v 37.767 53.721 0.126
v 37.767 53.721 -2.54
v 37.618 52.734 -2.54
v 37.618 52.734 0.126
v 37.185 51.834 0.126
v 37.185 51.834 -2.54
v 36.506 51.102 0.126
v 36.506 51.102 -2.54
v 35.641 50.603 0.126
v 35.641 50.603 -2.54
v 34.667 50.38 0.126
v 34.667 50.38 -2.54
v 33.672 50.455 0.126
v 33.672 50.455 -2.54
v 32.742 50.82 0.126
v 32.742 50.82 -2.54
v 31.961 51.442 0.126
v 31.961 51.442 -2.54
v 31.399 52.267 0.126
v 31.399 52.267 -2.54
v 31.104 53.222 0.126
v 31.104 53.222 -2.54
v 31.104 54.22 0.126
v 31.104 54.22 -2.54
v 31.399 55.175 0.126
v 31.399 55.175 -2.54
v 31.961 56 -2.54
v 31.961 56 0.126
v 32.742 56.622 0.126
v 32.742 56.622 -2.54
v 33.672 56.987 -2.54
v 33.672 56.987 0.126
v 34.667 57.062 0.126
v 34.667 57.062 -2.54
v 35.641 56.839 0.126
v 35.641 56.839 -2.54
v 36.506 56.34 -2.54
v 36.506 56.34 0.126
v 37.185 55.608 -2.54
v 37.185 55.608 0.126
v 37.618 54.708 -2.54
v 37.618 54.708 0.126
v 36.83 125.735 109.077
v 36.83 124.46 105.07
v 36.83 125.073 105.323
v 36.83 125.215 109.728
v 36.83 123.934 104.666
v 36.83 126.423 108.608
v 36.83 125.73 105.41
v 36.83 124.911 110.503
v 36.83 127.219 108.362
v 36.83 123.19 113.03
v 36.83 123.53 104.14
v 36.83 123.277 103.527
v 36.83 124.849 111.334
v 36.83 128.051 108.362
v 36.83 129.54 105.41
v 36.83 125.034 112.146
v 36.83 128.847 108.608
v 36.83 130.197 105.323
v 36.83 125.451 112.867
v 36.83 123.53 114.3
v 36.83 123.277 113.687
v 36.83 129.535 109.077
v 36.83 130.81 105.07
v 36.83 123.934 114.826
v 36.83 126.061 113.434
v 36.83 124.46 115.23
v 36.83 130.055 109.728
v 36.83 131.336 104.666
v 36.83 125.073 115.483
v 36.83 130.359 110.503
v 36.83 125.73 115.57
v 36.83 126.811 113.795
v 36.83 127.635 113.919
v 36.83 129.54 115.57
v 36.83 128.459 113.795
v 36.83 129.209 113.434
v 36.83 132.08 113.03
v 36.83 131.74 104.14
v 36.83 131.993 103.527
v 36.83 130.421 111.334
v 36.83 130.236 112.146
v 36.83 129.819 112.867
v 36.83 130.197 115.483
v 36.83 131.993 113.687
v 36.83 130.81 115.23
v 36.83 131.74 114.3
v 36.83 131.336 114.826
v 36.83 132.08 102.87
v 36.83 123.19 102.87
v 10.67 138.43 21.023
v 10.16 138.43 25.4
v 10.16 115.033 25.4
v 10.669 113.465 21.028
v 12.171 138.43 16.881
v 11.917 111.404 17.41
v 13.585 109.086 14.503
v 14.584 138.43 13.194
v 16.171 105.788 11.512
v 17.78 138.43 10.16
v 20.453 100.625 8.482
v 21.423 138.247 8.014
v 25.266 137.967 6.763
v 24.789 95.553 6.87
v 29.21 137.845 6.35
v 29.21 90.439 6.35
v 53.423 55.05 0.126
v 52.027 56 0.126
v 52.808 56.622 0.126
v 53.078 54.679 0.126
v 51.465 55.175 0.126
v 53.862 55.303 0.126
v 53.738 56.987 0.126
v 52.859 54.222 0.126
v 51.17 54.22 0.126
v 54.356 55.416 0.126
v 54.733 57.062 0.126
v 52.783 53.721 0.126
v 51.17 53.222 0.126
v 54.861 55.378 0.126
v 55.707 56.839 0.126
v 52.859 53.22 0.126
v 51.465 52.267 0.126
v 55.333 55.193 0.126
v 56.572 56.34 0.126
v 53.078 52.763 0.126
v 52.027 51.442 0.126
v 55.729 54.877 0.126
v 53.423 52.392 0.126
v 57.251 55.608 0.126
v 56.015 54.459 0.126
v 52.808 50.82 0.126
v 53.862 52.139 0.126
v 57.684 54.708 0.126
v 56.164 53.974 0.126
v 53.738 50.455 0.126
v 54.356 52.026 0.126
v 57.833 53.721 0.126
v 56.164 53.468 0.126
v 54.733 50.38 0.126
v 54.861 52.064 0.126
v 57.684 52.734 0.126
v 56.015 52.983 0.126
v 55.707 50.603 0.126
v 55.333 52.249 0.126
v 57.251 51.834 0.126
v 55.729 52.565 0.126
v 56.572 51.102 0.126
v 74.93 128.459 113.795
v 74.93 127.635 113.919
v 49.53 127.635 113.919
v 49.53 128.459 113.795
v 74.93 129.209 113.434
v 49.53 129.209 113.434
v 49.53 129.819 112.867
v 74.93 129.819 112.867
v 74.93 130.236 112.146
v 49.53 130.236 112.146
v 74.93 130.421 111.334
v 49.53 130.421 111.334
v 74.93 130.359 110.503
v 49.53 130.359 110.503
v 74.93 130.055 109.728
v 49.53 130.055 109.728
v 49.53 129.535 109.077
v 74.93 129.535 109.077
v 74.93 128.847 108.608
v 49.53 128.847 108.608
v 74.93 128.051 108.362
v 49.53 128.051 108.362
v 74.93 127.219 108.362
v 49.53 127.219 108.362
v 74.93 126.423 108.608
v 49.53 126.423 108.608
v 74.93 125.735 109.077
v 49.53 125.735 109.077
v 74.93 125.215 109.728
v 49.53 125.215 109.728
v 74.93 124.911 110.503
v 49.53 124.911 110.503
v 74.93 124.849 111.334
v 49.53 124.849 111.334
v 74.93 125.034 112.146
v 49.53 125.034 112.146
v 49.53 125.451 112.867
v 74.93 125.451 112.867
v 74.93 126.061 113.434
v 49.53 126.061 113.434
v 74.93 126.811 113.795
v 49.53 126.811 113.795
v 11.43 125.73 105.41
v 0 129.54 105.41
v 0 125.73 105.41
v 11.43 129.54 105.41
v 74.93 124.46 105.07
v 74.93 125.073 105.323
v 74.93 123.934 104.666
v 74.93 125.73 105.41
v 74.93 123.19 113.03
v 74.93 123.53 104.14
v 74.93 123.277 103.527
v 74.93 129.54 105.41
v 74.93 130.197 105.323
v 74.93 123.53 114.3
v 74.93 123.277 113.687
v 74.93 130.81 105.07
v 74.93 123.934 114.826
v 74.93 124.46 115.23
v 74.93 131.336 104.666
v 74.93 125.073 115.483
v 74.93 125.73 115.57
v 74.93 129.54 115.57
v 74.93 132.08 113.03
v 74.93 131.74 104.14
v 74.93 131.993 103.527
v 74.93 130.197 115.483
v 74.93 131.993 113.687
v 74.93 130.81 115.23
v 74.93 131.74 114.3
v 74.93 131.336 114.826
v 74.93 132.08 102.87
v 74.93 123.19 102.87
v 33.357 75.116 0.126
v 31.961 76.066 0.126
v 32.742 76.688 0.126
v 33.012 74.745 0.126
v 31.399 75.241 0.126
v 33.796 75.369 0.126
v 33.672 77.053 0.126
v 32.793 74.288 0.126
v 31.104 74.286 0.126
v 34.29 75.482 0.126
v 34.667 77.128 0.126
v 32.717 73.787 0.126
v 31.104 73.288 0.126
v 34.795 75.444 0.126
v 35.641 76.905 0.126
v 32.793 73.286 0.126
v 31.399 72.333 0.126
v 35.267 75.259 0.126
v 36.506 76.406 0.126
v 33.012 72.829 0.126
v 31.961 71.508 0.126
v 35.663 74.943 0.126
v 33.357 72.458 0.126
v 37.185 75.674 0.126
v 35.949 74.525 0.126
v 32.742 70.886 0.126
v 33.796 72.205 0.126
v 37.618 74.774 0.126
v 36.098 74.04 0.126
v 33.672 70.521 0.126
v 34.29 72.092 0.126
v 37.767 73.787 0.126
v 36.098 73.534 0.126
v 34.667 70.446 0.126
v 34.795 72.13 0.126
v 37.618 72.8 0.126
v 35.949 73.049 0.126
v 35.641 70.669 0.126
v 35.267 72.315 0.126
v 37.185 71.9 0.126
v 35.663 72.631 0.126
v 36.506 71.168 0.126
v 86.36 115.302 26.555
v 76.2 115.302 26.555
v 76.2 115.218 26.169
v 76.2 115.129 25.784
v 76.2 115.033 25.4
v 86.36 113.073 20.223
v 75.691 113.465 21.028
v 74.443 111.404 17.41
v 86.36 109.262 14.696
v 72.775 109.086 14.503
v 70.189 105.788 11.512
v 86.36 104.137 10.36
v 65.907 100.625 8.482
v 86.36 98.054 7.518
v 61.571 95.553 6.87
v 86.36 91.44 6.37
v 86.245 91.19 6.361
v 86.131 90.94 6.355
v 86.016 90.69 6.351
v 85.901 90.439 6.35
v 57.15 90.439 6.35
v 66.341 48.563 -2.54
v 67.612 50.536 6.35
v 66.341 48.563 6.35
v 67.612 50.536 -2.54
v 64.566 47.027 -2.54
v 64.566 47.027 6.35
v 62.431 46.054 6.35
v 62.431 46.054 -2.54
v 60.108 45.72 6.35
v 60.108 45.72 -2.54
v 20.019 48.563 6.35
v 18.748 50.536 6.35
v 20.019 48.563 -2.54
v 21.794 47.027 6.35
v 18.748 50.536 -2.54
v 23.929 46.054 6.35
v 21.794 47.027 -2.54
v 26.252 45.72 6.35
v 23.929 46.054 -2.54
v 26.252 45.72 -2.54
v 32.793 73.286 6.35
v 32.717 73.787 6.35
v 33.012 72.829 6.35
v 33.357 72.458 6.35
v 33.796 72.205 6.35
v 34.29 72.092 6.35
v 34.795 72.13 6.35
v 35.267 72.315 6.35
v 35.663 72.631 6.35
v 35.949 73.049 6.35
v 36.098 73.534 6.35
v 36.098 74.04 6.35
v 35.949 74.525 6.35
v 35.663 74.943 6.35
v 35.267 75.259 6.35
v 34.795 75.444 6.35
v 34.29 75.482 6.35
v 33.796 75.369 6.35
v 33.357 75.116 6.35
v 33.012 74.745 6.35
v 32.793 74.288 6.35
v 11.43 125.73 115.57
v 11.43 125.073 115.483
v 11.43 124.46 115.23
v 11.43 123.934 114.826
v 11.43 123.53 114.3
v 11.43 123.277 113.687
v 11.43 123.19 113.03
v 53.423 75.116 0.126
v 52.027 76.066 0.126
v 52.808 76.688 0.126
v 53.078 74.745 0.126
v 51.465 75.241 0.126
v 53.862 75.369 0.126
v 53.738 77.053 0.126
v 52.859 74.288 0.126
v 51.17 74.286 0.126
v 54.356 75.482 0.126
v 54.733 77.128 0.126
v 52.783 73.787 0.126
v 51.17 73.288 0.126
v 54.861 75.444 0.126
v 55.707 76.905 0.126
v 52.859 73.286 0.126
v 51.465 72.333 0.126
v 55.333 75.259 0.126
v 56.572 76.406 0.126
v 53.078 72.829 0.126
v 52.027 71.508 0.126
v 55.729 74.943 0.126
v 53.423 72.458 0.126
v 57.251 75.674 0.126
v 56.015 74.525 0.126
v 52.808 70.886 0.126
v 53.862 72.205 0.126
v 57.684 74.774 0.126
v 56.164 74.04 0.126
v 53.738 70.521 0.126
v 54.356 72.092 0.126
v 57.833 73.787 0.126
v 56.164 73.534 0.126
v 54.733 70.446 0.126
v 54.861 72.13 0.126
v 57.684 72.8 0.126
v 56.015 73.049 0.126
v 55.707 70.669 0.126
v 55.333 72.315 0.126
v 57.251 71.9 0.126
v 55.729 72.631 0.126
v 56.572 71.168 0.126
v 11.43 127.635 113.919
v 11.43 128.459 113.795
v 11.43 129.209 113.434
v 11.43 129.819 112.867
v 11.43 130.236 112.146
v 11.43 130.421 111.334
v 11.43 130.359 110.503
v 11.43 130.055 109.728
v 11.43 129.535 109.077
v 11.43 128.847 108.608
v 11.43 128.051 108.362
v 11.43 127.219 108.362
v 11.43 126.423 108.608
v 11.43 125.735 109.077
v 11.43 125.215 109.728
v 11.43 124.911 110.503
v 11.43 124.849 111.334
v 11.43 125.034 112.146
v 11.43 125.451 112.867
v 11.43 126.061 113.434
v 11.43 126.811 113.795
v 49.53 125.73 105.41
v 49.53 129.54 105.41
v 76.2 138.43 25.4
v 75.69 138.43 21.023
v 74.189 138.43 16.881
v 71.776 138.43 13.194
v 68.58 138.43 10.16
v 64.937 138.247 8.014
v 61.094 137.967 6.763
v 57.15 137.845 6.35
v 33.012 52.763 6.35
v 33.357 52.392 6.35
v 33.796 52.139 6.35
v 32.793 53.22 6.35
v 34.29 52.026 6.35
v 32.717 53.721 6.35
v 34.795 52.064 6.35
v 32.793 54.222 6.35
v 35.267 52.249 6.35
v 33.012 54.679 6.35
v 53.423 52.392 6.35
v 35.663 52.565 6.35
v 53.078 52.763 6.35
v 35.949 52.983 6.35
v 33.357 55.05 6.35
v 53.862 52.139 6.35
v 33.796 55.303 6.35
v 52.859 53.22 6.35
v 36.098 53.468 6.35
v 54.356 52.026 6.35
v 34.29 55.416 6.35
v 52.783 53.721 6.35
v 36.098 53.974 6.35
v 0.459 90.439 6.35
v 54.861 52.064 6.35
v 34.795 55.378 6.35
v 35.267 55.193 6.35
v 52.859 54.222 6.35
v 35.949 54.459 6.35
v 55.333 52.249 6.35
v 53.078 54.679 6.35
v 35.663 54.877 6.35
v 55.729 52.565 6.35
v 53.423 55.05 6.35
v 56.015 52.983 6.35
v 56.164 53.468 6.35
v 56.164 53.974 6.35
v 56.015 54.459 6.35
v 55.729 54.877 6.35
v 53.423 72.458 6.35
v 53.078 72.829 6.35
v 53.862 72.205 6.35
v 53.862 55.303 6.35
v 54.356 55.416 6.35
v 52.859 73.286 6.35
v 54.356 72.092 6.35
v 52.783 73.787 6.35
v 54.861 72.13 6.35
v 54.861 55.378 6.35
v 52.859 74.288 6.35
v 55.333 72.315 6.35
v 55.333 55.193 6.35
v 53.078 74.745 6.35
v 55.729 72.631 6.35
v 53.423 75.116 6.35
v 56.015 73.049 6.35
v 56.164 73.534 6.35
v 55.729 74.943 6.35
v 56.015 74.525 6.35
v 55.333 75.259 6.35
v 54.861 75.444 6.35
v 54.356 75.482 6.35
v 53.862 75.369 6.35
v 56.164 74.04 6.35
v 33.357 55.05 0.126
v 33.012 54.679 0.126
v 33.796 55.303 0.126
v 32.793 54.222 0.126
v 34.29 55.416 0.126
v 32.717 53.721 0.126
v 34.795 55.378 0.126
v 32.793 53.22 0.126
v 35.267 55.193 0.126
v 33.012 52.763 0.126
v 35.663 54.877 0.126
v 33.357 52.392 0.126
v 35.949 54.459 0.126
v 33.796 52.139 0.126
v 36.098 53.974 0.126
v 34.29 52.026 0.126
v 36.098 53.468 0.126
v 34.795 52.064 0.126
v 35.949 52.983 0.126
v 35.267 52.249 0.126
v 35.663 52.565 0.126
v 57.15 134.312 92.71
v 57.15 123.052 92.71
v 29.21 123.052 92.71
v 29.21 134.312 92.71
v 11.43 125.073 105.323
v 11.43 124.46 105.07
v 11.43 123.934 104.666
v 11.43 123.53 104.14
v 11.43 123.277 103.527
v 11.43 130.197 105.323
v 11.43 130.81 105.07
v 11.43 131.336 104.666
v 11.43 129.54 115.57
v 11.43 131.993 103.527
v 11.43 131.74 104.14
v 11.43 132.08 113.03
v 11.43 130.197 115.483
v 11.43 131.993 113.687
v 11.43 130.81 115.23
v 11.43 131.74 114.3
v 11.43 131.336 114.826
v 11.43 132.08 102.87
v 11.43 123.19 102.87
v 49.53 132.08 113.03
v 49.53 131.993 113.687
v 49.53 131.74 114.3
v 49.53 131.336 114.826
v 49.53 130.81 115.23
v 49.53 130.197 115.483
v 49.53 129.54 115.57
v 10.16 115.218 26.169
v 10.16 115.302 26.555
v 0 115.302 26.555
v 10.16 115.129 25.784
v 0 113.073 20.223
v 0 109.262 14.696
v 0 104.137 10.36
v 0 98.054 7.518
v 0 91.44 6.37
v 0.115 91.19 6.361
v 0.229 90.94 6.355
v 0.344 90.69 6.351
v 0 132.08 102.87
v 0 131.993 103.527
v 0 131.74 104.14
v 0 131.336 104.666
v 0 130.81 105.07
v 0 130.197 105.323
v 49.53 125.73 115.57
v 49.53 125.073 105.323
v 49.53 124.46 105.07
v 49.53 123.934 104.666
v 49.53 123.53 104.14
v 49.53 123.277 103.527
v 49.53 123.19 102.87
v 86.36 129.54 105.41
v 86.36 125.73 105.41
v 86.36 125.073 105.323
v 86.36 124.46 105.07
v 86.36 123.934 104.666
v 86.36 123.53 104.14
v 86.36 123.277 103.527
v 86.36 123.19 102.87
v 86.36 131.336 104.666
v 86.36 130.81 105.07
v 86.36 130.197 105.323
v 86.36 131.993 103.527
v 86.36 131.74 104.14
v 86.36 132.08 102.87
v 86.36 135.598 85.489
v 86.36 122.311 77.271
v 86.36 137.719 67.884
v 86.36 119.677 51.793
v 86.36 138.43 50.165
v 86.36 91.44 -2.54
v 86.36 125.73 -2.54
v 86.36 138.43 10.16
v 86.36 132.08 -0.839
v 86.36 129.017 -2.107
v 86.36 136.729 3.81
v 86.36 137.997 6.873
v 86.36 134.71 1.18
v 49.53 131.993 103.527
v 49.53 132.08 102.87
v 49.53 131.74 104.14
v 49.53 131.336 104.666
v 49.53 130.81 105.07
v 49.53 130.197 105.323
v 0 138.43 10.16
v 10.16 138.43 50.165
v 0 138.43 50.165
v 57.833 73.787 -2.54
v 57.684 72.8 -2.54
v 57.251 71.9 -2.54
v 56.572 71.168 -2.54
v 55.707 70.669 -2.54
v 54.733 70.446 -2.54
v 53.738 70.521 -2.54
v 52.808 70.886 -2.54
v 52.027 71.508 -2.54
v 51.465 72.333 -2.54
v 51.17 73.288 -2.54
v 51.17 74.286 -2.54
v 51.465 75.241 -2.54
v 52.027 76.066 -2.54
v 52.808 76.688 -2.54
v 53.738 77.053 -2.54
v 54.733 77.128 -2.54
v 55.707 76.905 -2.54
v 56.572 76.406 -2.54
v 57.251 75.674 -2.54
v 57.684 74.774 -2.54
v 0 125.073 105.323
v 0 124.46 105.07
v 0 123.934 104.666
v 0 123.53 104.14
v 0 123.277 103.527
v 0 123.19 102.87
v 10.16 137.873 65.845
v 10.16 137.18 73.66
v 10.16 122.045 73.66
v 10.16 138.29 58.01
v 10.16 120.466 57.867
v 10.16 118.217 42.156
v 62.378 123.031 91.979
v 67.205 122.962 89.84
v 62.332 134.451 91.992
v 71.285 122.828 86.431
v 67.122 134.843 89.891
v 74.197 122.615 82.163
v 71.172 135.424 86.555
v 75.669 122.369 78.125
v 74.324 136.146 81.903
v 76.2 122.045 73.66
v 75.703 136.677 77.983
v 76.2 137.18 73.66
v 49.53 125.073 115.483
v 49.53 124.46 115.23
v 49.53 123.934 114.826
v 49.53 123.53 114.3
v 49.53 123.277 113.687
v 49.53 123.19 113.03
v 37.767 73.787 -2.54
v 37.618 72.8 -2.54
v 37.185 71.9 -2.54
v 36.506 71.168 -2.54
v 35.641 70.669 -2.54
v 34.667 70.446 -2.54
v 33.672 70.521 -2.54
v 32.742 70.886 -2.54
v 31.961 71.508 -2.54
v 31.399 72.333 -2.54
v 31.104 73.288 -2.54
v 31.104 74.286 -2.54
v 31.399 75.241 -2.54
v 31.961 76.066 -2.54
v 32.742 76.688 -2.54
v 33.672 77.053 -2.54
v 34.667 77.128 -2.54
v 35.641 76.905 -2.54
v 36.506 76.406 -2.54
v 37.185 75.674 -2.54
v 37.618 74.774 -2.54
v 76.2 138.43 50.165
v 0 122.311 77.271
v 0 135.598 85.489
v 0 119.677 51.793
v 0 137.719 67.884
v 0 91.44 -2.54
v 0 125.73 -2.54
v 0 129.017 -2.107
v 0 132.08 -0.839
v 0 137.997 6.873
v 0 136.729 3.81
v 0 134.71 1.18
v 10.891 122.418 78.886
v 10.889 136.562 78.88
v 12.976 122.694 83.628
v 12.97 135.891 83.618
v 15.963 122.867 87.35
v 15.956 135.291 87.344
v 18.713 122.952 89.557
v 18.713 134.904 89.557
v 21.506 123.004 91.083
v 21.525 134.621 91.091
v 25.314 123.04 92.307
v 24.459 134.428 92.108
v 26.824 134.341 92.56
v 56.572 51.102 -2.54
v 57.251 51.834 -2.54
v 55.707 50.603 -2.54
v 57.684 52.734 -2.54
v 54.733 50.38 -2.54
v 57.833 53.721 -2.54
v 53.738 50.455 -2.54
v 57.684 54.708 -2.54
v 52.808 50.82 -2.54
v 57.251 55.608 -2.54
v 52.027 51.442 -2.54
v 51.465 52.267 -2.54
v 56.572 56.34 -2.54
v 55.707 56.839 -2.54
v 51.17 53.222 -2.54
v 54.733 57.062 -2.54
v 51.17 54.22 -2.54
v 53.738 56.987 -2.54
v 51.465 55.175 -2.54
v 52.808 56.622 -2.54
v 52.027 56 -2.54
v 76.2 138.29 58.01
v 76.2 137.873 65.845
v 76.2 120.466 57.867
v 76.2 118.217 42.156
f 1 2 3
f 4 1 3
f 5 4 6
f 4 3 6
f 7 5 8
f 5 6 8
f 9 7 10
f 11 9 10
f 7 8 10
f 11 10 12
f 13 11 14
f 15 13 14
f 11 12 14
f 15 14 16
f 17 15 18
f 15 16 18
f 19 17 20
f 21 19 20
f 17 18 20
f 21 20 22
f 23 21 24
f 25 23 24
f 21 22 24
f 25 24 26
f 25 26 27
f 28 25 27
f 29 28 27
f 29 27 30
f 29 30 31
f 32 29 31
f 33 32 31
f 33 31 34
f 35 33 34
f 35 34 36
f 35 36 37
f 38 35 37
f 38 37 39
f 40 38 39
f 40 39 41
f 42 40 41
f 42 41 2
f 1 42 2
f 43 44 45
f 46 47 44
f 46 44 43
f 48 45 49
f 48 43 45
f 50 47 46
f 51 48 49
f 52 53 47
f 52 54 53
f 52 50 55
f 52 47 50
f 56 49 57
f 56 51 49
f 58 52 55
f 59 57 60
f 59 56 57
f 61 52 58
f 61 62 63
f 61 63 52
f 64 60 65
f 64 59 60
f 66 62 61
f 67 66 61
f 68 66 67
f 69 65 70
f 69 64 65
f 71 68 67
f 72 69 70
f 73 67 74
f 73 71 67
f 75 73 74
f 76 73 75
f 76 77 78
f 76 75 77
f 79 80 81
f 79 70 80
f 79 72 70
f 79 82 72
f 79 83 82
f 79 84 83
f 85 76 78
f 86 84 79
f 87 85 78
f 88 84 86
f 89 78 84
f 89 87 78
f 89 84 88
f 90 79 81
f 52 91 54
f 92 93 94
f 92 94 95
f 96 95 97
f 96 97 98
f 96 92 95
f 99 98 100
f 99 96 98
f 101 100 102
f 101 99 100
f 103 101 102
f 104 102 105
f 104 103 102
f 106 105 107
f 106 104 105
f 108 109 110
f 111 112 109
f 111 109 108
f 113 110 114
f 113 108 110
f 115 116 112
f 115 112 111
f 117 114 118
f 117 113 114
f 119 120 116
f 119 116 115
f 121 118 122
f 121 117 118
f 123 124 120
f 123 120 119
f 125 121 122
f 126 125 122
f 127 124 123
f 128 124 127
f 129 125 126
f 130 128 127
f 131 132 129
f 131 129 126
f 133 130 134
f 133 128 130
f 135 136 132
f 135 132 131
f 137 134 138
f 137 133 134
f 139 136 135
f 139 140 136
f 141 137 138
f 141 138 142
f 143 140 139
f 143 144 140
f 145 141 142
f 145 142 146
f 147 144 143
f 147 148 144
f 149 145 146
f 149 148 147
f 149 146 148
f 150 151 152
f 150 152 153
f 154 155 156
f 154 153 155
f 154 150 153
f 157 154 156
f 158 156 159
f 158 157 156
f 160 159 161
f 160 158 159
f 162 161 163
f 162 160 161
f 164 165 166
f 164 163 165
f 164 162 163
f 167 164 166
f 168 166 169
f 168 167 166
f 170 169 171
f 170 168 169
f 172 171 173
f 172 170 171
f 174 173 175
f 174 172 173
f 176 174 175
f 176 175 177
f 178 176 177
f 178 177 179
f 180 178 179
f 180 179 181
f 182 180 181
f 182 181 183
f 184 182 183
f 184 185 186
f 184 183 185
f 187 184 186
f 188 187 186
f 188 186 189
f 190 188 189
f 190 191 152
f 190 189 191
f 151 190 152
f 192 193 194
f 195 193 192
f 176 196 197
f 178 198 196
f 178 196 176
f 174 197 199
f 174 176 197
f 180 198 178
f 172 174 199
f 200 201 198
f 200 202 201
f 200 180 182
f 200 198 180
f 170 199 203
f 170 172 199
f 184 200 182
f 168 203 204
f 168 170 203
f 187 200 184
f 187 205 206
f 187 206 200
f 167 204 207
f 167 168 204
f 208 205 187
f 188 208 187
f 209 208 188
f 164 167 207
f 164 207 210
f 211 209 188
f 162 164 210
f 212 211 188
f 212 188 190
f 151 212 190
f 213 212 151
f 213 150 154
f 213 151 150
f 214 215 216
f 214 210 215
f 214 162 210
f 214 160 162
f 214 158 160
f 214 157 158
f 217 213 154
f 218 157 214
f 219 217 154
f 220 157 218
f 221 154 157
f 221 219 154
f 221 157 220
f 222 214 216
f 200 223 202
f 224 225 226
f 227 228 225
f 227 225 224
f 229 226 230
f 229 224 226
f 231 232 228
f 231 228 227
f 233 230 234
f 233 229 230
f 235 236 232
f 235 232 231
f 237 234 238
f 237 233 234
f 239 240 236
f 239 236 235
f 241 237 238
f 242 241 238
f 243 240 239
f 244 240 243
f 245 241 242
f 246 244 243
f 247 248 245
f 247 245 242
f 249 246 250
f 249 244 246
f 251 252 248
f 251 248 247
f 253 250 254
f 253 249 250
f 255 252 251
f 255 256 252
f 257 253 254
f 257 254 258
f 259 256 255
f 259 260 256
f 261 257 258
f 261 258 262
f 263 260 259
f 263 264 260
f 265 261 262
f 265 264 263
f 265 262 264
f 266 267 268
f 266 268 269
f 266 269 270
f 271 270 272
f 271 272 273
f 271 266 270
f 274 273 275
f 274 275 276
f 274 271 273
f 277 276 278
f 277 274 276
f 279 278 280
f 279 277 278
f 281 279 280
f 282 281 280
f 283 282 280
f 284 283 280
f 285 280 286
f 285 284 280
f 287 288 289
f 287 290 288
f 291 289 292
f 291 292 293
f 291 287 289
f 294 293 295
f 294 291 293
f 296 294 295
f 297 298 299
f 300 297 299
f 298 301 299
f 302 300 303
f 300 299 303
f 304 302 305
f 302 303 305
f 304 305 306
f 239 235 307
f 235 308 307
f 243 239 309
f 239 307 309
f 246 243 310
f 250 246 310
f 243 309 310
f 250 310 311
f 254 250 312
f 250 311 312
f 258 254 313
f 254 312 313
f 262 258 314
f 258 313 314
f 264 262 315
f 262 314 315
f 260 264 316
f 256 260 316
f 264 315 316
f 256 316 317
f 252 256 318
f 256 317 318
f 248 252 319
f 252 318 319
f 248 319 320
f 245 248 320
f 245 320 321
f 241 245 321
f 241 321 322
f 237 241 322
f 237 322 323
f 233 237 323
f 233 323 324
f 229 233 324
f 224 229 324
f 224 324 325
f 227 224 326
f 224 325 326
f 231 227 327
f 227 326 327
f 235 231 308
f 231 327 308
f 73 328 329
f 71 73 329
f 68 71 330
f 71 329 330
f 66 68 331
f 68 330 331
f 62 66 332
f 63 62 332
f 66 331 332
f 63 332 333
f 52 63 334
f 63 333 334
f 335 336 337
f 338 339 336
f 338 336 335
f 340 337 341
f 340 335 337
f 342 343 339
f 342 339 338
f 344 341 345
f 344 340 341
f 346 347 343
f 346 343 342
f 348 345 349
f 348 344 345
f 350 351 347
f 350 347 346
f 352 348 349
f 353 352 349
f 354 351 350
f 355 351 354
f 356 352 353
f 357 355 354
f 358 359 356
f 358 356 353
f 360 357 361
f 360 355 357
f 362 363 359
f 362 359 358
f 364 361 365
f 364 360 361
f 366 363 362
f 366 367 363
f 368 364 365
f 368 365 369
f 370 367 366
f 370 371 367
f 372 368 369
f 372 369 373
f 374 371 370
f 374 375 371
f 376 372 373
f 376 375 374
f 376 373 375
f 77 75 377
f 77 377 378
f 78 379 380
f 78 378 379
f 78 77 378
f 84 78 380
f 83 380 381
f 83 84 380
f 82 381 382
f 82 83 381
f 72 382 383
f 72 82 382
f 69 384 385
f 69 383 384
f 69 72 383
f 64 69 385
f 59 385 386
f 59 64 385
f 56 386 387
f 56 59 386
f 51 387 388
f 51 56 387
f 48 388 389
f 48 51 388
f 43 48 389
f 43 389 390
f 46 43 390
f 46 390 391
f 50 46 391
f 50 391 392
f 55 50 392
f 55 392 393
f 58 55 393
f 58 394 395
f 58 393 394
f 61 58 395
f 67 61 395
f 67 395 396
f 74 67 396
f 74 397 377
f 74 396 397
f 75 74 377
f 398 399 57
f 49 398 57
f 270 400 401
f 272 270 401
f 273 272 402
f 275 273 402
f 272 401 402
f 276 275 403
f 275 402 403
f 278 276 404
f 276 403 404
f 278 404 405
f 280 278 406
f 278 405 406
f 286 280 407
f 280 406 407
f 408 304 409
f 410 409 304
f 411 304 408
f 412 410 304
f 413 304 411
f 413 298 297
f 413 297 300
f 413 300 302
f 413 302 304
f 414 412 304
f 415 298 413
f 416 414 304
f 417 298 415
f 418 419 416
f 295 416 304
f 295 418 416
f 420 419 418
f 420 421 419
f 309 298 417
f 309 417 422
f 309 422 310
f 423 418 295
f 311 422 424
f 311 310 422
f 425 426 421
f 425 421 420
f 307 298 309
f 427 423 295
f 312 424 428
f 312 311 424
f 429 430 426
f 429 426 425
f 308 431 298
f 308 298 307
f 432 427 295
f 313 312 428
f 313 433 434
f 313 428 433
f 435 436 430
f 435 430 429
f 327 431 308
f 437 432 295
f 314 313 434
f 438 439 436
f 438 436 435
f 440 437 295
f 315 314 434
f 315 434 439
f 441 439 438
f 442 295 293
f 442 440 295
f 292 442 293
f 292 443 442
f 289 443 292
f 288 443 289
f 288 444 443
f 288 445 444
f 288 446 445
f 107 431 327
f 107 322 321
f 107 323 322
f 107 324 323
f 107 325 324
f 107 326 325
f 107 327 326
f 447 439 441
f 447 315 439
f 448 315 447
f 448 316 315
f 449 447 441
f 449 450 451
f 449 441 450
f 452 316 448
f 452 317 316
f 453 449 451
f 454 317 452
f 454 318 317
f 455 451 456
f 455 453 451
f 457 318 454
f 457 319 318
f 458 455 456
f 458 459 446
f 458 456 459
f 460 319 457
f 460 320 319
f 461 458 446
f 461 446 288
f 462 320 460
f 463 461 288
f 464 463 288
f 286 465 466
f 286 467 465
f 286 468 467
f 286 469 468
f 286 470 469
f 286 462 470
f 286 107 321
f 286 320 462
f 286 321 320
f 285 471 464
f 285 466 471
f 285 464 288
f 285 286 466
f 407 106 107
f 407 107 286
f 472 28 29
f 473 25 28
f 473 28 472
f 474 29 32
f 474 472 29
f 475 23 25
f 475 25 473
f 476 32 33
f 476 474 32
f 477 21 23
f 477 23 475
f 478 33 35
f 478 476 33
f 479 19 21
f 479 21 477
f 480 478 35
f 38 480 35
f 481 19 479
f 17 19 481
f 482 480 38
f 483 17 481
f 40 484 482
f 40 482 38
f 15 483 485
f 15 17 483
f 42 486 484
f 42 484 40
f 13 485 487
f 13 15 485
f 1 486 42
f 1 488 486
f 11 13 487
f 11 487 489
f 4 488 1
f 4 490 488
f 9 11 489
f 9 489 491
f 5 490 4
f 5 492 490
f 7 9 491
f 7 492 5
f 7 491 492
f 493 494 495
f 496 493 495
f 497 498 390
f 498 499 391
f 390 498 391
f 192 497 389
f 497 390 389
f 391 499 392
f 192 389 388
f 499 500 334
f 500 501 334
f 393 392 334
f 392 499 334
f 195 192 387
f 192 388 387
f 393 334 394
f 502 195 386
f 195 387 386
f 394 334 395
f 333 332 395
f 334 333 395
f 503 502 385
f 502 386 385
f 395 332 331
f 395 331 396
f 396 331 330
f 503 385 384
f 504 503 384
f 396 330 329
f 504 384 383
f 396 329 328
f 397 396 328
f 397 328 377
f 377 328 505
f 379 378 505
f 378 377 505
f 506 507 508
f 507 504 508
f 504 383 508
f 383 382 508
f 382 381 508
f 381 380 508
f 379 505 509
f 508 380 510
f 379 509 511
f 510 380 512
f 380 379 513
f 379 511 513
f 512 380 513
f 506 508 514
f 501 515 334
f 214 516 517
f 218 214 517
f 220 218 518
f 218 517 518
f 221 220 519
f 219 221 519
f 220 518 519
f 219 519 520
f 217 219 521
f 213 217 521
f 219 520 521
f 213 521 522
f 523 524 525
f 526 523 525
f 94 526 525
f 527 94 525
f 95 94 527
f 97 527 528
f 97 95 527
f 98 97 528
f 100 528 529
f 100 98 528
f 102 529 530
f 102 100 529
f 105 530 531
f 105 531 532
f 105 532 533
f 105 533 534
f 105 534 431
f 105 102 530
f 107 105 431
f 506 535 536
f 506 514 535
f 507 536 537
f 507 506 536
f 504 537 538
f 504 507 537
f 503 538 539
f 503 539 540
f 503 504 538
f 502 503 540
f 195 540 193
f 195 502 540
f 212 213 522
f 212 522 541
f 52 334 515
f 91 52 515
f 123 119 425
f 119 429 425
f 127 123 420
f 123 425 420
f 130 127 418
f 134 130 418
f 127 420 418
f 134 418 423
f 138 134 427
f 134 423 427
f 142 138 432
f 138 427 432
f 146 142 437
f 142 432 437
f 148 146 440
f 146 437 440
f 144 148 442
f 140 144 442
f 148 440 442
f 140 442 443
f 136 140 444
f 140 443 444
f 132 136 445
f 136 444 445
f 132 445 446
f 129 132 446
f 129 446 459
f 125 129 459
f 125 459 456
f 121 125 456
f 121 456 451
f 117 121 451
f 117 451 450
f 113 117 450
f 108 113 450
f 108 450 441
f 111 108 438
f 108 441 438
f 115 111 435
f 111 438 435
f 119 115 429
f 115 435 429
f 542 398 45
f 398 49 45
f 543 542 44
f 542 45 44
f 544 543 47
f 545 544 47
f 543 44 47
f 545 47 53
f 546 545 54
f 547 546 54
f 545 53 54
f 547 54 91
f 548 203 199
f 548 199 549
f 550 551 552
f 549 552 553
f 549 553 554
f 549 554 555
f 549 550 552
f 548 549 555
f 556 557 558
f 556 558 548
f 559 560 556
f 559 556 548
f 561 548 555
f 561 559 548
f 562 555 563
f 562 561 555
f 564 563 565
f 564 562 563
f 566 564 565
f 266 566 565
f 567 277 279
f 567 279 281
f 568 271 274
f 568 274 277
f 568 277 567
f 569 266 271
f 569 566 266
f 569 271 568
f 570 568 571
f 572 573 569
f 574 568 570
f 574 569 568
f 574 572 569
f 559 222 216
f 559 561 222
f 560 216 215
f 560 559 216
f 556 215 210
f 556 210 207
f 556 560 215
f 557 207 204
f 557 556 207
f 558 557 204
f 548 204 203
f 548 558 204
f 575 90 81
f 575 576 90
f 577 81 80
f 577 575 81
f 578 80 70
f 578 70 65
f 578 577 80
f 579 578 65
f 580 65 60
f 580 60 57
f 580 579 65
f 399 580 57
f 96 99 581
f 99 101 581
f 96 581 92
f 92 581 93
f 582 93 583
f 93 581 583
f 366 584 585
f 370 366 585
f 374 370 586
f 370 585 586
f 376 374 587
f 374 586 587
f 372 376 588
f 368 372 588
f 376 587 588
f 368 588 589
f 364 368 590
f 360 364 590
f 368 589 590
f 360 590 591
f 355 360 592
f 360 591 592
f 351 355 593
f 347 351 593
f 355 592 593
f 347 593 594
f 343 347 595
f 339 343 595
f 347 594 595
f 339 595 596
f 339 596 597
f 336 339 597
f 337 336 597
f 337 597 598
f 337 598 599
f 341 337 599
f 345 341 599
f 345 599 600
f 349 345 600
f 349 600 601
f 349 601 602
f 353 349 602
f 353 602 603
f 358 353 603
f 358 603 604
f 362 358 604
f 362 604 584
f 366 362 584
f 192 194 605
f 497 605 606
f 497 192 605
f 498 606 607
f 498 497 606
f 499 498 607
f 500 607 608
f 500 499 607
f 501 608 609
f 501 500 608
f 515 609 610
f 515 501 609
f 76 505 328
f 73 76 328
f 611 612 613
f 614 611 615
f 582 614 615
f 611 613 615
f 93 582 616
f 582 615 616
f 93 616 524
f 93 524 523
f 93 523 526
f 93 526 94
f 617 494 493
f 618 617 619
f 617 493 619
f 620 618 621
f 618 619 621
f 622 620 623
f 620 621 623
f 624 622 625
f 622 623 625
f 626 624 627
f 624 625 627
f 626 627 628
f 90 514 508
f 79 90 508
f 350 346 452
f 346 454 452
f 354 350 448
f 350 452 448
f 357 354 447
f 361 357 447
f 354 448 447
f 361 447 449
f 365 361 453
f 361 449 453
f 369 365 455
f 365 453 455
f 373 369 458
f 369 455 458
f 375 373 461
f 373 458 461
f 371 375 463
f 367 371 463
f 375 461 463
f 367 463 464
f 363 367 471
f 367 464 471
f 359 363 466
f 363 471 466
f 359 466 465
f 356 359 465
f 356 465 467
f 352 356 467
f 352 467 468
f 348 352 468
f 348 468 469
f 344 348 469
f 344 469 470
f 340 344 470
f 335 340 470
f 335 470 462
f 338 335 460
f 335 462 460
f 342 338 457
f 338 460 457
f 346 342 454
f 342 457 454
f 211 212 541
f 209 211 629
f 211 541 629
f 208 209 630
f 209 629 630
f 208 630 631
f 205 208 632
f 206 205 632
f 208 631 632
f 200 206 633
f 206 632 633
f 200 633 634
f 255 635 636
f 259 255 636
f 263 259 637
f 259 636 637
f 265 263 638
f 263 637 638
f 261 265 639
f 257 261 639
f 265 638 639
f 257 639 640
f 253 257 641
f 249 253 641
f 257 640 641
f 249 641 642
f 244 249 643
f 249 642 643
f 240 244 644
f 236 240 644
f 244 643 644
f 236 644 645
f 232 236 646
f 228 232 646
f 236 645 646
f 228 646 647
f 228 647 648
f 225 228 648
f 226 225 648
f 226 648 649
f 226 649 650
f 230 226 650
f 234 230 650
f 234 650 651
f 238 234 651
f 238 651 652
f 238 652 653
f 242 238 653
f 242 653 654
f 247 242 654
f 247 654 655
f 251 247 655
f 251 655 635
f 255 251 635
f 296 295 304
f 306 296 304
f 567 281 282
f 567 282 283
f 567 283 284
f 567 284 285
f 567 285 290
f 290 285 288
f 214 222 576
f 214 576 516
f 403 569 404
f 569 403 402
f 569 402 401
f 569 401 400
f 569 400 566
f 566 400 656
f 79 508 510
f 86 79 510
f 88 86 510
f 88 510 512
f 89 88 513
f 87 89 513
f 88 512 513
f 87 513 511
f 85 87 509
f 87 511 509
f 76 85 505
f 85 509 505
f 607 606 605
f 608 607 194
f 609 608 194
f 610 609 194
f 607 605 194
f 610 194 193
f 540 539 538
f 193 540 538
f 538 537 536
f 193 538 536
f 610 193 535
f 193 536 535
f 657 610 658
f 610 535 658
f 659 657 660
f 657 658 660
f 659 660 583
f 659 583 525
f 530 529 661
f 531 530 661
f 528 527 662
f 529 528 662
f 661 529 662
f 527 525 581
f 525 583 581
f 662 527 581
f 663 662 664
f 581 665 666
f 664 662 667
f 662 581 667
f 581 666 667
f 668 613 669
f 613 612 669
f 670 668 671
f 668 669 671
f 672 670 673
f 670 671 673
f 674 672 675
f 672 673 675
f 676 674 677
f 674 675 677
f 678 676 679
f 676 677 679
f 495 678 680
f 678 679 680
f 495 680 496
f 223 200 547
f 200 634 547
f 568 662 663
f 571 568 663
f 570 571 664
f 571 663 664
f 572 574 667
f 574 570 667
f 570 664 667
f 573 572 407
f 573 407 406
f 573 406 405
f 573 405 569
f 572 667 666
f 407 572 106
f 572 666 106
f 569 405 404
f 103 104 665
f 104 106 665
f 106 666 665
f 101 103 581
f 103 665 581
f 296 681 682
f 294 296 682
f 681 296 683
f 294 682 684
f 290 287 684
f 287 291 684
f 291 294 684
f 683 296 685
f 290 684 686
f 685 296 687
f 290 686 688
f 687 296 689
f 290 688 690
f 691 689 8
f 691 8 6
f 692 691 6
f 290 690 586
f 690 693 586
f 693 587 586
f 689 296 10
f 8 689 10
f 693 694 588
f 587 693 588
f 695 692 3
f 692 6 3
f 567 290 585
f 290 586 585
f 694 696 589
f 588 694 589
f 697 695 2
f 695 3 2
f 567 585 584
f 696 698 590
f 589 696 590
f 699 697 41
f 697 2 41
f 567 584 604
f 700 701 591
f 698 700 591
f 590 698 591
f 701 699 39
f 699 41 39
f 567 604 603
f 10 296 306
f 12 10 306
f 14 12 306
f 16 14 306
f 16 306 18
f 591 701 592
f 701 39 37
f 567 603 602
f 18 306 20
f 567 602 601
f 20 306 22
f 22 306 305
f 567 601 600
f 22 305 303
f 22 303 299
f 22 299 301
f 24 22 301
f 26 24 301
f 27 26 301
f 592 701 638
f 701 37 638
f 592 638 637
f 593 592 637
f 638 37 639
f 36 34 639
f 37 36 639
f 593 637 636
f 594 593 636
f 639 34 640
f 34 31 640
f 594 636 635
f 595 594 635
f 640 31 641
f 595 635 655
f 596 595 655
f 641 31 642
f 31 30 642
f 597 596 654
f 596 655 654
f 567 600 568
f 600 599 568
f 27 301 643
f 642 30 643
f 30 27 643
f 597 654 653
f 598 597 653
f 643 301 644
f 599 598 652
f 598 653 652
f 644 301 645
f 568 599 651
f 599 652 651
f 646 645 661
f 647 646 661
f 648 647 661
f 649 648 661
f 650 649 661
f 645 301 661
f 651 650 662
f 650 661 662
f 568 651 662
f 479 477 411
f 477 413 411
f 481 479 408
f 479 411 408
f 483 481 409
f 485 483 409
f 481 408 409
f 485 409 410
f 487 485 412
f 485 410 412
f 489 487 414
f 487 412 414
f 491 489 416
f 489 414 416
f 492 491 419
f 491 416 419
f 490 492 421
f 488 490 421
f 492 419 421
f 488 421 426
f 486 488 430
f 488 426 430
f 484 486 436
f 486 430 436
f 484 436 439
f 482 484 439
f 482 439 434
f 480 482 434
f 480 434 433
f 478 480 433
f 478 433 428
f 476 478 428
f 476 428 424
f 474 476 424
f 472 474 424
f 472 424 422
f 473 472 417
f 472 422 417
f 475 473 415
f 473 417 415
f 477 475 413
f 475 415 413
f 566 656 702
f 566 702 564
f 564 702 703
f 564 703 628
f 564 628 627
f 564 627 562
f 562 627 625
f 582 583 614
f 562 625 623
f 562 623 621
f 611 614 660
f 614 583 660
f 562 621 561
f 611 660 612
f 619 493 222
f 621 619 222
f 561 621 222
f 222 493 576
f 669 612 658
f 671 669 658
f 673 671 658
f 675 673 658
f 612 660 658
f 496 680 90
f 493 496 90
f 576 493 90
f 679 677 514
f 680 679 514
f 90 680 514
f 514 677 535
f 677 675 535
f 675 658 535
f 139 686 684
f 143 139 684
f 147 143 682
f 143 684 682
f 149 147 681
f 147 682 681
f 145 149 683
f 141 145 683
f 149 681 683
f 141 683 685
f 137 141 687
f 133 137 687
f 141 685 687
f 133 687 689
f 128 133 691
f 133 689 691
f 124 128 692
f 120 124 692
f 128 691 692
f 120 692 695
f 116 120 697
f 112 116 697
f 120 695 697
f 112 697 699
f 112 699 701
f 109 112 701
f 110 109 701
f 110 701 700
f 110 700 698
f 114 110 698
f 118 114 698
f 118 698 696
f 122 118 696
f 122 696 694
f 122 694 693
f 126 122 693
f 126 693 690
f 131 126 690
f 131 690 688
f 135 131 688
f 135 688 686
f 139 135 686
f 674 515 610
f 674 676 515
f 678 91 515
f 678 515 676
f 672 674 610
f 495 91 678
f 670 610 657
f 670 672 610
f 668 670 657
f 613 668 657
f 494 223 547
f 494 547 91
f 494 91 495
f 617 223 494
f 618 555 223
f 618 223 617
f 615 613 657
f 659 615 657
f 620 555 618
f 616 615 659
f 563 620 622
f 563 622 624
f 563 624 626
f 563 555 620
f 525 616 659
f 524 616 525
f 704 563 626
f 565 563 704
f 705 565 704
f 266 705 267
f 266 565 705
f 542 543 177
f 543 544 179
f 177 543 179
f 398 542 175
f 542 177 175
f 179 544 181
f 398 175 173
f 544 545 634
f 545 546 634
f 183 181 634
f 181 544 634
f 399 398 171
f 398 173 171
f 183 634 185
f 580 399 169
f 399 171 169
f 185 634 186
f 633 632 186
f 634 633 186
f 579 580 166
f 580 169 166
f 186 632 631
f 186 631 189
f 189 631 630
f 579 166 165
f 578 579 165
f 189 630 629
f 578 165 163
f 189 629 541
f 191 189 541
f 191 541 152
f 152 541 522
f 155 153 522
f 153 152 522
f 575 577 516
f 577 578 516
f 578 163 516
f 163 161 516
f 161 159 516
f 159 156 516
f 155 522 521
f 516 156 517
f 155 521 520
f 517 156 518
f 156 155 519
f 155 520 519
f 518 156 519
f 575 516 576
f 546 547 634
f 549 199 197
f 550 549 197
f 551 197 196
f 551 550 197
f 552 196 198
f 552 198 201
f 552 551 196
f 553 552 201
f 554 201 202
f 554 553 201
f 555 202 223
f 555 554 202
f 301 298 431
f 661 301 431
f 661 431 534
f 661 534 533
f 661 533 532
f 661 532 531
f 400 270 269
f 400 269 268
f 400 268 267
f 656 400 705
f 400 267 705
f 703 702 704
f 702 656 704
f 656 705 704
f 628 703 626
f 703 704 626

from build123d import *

# Parameters (mm, degrees)
BOSS_EXTRUDE2_DEPTH             = 6.35
BOSS_EXTRUDE2_DEPTH_BACK        = 2.54
SKETCH2_W                       = 86.35999999999999
SKETCH2_H                       = 132.07999999999998
SKETCH3_W                       = 86.35999999999999
SKETCH3_H                       = 8.889999999999999
BOSS_EXTRUDE3_DEPTH             = 101.6
SKETCH6_W                       = 25.39999999999999
SKETCH6_H                       = 8.89
BOSS_EXTRUDE4_DEPTH             = 6.35
CBORE_FOR_M3_SBHCS1_D           = 3.4
CBORE_FOR_M3_SBHCS1_CBORE_D     = 6.7
CBORE_FOR_M3_SBHCS1_CBORE_DEPTH = 2.666
CUT_EXTRUDE3_DEPTH              = 182.55670546691465
CUT_EXTRUDE3_DEPTH_BACK         = 182.55670546691465
SKETCH7_R                       = 2.7940000000000107
FILLET1_R                       = 2.5399999999999996
SKETCH11_W                      = 86.35999999999999
SKETCH11_H                      = 8.889999999999999
CUT_EXTRUDE4_DEPTH              = 22.86
SKETCH12_W                      = 11.429999999999993
SKETCH12_H                      = 8.89
SKETCH12_W_2                    = 11.429999999999998
CUT_EXTRUDE5_DEPTH              = 2.5399999999999996
MOVE_START                      = 11.43
MOVE_FACE1_DEPTH                = 25.4
MOVE_START_2                    = 49.53
MOVE_FACE1_2_DEPTH              = 25.4
SKETCH13_W                      = 86.35999999999999
SKETCH13_H                      = 78.74000000000001
CUT_EXTRUDE6_DEPTH              = 190.71096594556678
CUT_EXTRUDE7_DEPTH              = 192.9171289906141
FILLET8_R                       = 2.54
BOSS_EXTRUDE6_START             = -86.36
BOSS_EXTRUDE6_DEPTH             = 86.36
BOSS_EXTRUDE8_START             = -86.36
BOSS_EXTRUDE8_DEPTH             = 86.36
CUT_EXTRUDE8_DEPTH              = 169.1443549453861
CUT_EXTRUDE8_DEPTH_BACK         = 169.1443549453861
FILLET12_R                      = 19.05
FILLET13_R                      = 25.4
FILLET14_R                      = 8.255
FILLET16_R                      = 12.7


# Read off the part's stored shape, not the designer's step: Move Face1
with BuildPart() as part:
    # Sketch2 → Boss-Extrude2 (new, two sides: drawn at the far end of the back side and taken through both)
    with BuildSketch(Plane.XY.offset(-BOSS_EXTRUDE2_DEPTH_BACK)):
        with Locations((43.17999999999999, 66.03999999999999)):
            Rectangle(SKETCH2_W, SKETCH2_H)
    extrude(amount=BOSS_EXTRUDE2_DEPTH + BOSS_EXTRUDE2_DEPTH_BACK)

    # Sketch3 → Boss-Extrude3 (add)
    with BuildSketch(Plane.XY.offset(6.35)):
        Polygon((0, 132.07999999999998), (86.35999999999999, 132.07999999999998), (86.35999999999999, 123.18999999999998), (-3.27e-15, 123.18999999999998), align=None)
        with Locations((43.17999999999999, 4.444999999999999)):
            Rectangle(SKETCH3_W, SKETCH3_H)
    extrude(amount=BOSS_EXTRUDE3_DEPTH)

    # Sketch6 → Boss-Extrude4 (add)
    with BuildSketch(Plane.XY.offset(107.94999999999999)):
        with Locations((62.23, 127.63499999999999)):
            Rectangle(SKETCH6_W, SKETCH6_H)
        with Locations((24.129999999999995, 127.63499999999999)):
            Rectangle(SKETCH6_W, SKETCH6_H)
    extrude(amount=BOSS_EXTRUDE4_DEPTH)

    # CBORE for M3 SBHCS1 (through all)
    with Locations(Plane(origin=(0, 0, -2.54), x_dir=(1, 0, 0), z_dir=(0, 0, -1))):
        with Locations((34.417, -53.721), (54.483, -53.721), (34.417, -73.787), (54.483, -73.787)):
            CounterBoreHole(CBORE_FOR_M3_SBHCS1_D / 2, CBORE_FOR_M3_SBHCS1_CBORE_D / 2, CBORE_FOR_M3_SBHCS1_CBORE_DEPTH)

    # Sketch7 → Cut-Extrude3 (cut, two sides: drawn at the far end of the back side and taken through both)
    with BuildSketch(Plane.ZY.offset(-49.53).offset(-CUT_EXTRUDE3_DEPTH_BACK)):
        with Locations((111.12499999999999, 127.635)):
            Circle(SKETCH7_R)
    extrude(amount=CUT_EXTRUDE3_DEPTH + CUT_EXTRUDE3_DEPTH_BACK, mode=Mode.SUBTRACT)

    # Fillet1
    fillet1_edges = [part.edges().sort_by_distance(p)[0] for p in [
        (62.23, 123.18999999999998, 114.29999999999998),
        (62.23, 132.07999999999998, 114.29999999999998),
        (24.129999999999995, 123.18999999999998, 114.29999999999998),
        (24.129999999999995, 132.07999999999998, 114.29999999999998),
    ]]
    fillet(fillet1_edges, radius=FILLET1_R)

    # Sketch11 → Cut-Extrude4 (cut)
    with BuildSketch(Plane.XY.offset(107.94999999999999)):
        with Locations((43.17999999999999, 4.444999999999999)):
            Rectangle(SKETCH11_W, SKETCH11_H)
    extrude(amount=-CUT_EXTRUDE4_DEPTH, mode=Mode.SUBTRACT)

    # Sketch12 → Cut-Extrude5 (cut)
    with BuildSketch(Plane.XY.offset(107.94999999999999)):
        with Locations((80.64499999999998, 127.63499999999999)):
            Rectangle(SKETCH12_W, SKETCH12_H)
        Polygon((49.53, 123.18999999999998), (36.82999999999999, 123.18999999999997), (36.82999999999999, 132.07999999999998), (49.53, 132.07999999999998), align=None)
        with Locations((5.714999999999999, 127.63499999999999)):
            Rectangle(SKETCH12_W_2, SKETCH12_H)
    extrude(amount=-CUT_EXTRUDE5_DEPTH, mode=Mode.SUBTRACT)

    # Move Face1 outline → Move Face1 (add)
    with BuildSketch(Plane.YZ.offset(MOVE_START)):
        with BuildLine():
            ThreePointArc((132.08, 113.03), (131.336051224, 114.826051224), (129.54, 115.57))
            Line((129.54, 115.57), (125.73, 115.57))
            ThreePointArc((125.73, 115.57), (123.933948776, 114.826051224), (123.19, 113.03))
            Line((123.19, 113.03), (123.19, 111.76))
            ThreePointArc((123.19, 111.76), (123.933948776, 113.556051224), (125.73, 114.3))
            Line((125.73, 114.3), (129.54, 114.3))
            ThreePointArc((129.54, 114.3), (131.336051224, 113.556051224), (132.08, 111.76))
            Line((132.08, 111.76), (132.08, 113.03))
        make_face()
    extrude(amount=MOVE_FACE1_DEPTH)

    # Move Face1 2 outline → Move Face1 2 (add)
    with BuildSketch(Plane.YZ.offset(MOVE_START_2)):
        with BuildLine():
            ThreePointArc((132.08, 113.03), (131.336051224, 114.826051224), (129.54, 115.57))
            Line((129.54, 115.57), (125.73, 115.57))
            ThreePointArc((125.73, 115.57), (123.933948776, 114.826051224), (123.19, 113.03))
            Line((123.19, 113.03), (123.19, 111.76))
            ThreePointArc((123.19, 111.76), (123.933948776, 113.556051224), (125.73, 114.3))
            Line((125.73, 114.3), (129.54, 114.3))
            ThreePointArc((129.54, 114.3), (131.336051224, 113.556051224), (132.08, 111.76))
            Line((132.08, 111.76), (132.08, 113.03))
        make_face()
    extrude(amount=MOVE_FACE1_2_DEPTH)

    # Sketch13 → Cut-Extrude6 (cut, through all)
    with BuildSketch(Plane(origin=(0, 8.889999999999999, 0), x_dir=(1, 0, 0), z_dir=(0, 1, 0))):
        with Locations((43.17999999999999, -45.72)):
            Rectangle(SKETCH13_W, SKETCH13_H)
    extrude(amount=-CUT_EXTRUDE6_DEPTH, mode=Mode.SUBTRACT)

    # Sketch14 → Cut-Extrude7 (cut, through all)
    with BuildSketch(Plane.XY.offset(6.35)):
        Polygon((86.35999999999999, 91.43999999999998), (65.40499999999999, 45.71999999999999), (20.955, 45.71999999999999), (3.89e-15, 91.43999999999998), (0, 0), (86.35999999999999, 0), align=None)
    extrude(amount=-CUT_EXTRUDE7_DEPTH, mode=Mode.SUBTRACT)

    # Fillet8
    fillet8_edges = [part.edges().sort_by_distance(p)[0] for p in [
        (80.64499999999998, 123.18999999999998, 105.40999999999998),
        (80.64499999999998, 132.07999999999998, 105.40999999999998),
        (43.17999999999999, 123.18999999999997, 105.40999999999998),
        (43.17999999999999, 132.07999999999998, 105.40999999999998),
        (5.714999999999999, 123.18999999999998, 105.40999999999998),
        (5.714999999999999, 132.07999999999998, 105.40999999999998),
    ]]
    fillet(fillet8_edges, radius=FILLET8_R)

    # Sketch17 → Boss-Extrude6 (add)
    with BuildSketch(Plane(origin=(86.35999999999999, 0, 0), x_dir=(0, 0, -1), z_dir=(1, 0, 0)).offset(BOSS_EXTRUDE6_START)):
        with BuildLine():
            Line((-102.86999999999999, 132.07999999999998), (2.5400000000000063, 132.07999999999998))
            Line((2.54, 132.07999999999998), (2.5400000000000005, 138.42999999999998))
            Line((2.539999999999999, 138.42999999999998), (-50.165, 138.42999999999998))
            ThreePointArc((-50.16499999999999, 138.43), (-76.70777431972341, 136.8342768537044), (-102.86999999999999, 132.07999999999998))
        make_face()
    extrude(amount=BOSS_EXTRUDE6_DEPTH)

    # Sketch20 → Boss-Extrude8 (add)
    with BuildSketch(Plane.ZY.offset(BOSS_EXTRUDE8_START)):
        with BuildLine():
            Line((6.35, 110.48999999999998), (6.35, 123.18999999999998))
            Line((6.35, 123.18999999999998), (102.86999999999999, 123.18999999999998))
            ThreePointArc((102.86999999999999, 123.18999999999998), (54.19402954228848, 120.00137547860714), (6.35, 110.48999999999998))
        make_face()
    extrude(amount=BOSS_EXTRUDE8_DEPTH)

    # Sketch16 → Cut-Extrude8 (cut, two sides: drawn at the far end of the back side and taken through both)
    with BuildSketch(Plane(origin=(0, 132.07999999999998, 0), x_dir=(1, 0, 0), z_dir=(0, 1, 0)).offset(-CUT_EXTRUDE8_DEPTH_BACK)):
        Polygon((10.160000000000016, -92.71), (10.160000000000016, -6.350000000000009), (76.19999999999999, -6.350000000000002), (76.19999999999999, -92.71), align=None)
    extrude(amount=CUT_EXTRUDE8_DEPTH + CUT_EXTRUDE8_DEPTH_BACK, mode=Mode.SUBTRACT)

    # Fillet12
    fillet12_edges = [part.edges().sort_by_distance(p)[0] for p in [
        (10.160000000000016, 128.681636078935, 92.71),
        (76.19999999999999, 124.45999999999998, 6.350000000000002),
        (76.19999999999999, 128.681636078935, 92.71),
        (10.160000000000016, 124.45999999999998, 6.350000000000009),
    ]]
    fillet(fillet12_edges, radius=FILLET12_R)

    # Fillet13
    fillet13_edges = [part.edges().sort_by_distance(p)[0] for p in [
        (71.755, 110.49000000000001, 6.349999999999991),
        (14.605000000000006, 110.49000000000001, 6.349999999999989),
    ]]
    fillet(fillet13_edges, radius=FILLET13_R)

    # Fillet14
    fillet14_edges = [part.edges().sort_by_distance(p)[0] for p in [
        (20.955, 45.71999999999999, 1.9049999999999994),
        (65.40499999999999, 45.71999999999999, 1.9049999999999994),
    ]]
    fillet(fillet14_edges, radius=FILLET14_R)

    # Fillet16
    # the kernel refuses this fillet: 12.7 mm, written as the material it takes off along each edge
    with BuildSketch(Plane(origin=(-31.750000000000018, 138.42999999999998, -2.5400000000000005), x_dir=(0, 0, 1), z_dir=(1, 0, 0))) as fillet16_piece_1:
        with BuildLine():
            CenterArc((FILLET16_R, FILLET16_R), FILLET16_R, 180, 90)
            Line((3.11e-15, FILLET16_R), (0, 0))
            Line((0, 0), (FILLET16_R, 0))
        make_face()
    extrude(amount=149.86, mode=Mode.SUBTRACT)


solid = part.part
